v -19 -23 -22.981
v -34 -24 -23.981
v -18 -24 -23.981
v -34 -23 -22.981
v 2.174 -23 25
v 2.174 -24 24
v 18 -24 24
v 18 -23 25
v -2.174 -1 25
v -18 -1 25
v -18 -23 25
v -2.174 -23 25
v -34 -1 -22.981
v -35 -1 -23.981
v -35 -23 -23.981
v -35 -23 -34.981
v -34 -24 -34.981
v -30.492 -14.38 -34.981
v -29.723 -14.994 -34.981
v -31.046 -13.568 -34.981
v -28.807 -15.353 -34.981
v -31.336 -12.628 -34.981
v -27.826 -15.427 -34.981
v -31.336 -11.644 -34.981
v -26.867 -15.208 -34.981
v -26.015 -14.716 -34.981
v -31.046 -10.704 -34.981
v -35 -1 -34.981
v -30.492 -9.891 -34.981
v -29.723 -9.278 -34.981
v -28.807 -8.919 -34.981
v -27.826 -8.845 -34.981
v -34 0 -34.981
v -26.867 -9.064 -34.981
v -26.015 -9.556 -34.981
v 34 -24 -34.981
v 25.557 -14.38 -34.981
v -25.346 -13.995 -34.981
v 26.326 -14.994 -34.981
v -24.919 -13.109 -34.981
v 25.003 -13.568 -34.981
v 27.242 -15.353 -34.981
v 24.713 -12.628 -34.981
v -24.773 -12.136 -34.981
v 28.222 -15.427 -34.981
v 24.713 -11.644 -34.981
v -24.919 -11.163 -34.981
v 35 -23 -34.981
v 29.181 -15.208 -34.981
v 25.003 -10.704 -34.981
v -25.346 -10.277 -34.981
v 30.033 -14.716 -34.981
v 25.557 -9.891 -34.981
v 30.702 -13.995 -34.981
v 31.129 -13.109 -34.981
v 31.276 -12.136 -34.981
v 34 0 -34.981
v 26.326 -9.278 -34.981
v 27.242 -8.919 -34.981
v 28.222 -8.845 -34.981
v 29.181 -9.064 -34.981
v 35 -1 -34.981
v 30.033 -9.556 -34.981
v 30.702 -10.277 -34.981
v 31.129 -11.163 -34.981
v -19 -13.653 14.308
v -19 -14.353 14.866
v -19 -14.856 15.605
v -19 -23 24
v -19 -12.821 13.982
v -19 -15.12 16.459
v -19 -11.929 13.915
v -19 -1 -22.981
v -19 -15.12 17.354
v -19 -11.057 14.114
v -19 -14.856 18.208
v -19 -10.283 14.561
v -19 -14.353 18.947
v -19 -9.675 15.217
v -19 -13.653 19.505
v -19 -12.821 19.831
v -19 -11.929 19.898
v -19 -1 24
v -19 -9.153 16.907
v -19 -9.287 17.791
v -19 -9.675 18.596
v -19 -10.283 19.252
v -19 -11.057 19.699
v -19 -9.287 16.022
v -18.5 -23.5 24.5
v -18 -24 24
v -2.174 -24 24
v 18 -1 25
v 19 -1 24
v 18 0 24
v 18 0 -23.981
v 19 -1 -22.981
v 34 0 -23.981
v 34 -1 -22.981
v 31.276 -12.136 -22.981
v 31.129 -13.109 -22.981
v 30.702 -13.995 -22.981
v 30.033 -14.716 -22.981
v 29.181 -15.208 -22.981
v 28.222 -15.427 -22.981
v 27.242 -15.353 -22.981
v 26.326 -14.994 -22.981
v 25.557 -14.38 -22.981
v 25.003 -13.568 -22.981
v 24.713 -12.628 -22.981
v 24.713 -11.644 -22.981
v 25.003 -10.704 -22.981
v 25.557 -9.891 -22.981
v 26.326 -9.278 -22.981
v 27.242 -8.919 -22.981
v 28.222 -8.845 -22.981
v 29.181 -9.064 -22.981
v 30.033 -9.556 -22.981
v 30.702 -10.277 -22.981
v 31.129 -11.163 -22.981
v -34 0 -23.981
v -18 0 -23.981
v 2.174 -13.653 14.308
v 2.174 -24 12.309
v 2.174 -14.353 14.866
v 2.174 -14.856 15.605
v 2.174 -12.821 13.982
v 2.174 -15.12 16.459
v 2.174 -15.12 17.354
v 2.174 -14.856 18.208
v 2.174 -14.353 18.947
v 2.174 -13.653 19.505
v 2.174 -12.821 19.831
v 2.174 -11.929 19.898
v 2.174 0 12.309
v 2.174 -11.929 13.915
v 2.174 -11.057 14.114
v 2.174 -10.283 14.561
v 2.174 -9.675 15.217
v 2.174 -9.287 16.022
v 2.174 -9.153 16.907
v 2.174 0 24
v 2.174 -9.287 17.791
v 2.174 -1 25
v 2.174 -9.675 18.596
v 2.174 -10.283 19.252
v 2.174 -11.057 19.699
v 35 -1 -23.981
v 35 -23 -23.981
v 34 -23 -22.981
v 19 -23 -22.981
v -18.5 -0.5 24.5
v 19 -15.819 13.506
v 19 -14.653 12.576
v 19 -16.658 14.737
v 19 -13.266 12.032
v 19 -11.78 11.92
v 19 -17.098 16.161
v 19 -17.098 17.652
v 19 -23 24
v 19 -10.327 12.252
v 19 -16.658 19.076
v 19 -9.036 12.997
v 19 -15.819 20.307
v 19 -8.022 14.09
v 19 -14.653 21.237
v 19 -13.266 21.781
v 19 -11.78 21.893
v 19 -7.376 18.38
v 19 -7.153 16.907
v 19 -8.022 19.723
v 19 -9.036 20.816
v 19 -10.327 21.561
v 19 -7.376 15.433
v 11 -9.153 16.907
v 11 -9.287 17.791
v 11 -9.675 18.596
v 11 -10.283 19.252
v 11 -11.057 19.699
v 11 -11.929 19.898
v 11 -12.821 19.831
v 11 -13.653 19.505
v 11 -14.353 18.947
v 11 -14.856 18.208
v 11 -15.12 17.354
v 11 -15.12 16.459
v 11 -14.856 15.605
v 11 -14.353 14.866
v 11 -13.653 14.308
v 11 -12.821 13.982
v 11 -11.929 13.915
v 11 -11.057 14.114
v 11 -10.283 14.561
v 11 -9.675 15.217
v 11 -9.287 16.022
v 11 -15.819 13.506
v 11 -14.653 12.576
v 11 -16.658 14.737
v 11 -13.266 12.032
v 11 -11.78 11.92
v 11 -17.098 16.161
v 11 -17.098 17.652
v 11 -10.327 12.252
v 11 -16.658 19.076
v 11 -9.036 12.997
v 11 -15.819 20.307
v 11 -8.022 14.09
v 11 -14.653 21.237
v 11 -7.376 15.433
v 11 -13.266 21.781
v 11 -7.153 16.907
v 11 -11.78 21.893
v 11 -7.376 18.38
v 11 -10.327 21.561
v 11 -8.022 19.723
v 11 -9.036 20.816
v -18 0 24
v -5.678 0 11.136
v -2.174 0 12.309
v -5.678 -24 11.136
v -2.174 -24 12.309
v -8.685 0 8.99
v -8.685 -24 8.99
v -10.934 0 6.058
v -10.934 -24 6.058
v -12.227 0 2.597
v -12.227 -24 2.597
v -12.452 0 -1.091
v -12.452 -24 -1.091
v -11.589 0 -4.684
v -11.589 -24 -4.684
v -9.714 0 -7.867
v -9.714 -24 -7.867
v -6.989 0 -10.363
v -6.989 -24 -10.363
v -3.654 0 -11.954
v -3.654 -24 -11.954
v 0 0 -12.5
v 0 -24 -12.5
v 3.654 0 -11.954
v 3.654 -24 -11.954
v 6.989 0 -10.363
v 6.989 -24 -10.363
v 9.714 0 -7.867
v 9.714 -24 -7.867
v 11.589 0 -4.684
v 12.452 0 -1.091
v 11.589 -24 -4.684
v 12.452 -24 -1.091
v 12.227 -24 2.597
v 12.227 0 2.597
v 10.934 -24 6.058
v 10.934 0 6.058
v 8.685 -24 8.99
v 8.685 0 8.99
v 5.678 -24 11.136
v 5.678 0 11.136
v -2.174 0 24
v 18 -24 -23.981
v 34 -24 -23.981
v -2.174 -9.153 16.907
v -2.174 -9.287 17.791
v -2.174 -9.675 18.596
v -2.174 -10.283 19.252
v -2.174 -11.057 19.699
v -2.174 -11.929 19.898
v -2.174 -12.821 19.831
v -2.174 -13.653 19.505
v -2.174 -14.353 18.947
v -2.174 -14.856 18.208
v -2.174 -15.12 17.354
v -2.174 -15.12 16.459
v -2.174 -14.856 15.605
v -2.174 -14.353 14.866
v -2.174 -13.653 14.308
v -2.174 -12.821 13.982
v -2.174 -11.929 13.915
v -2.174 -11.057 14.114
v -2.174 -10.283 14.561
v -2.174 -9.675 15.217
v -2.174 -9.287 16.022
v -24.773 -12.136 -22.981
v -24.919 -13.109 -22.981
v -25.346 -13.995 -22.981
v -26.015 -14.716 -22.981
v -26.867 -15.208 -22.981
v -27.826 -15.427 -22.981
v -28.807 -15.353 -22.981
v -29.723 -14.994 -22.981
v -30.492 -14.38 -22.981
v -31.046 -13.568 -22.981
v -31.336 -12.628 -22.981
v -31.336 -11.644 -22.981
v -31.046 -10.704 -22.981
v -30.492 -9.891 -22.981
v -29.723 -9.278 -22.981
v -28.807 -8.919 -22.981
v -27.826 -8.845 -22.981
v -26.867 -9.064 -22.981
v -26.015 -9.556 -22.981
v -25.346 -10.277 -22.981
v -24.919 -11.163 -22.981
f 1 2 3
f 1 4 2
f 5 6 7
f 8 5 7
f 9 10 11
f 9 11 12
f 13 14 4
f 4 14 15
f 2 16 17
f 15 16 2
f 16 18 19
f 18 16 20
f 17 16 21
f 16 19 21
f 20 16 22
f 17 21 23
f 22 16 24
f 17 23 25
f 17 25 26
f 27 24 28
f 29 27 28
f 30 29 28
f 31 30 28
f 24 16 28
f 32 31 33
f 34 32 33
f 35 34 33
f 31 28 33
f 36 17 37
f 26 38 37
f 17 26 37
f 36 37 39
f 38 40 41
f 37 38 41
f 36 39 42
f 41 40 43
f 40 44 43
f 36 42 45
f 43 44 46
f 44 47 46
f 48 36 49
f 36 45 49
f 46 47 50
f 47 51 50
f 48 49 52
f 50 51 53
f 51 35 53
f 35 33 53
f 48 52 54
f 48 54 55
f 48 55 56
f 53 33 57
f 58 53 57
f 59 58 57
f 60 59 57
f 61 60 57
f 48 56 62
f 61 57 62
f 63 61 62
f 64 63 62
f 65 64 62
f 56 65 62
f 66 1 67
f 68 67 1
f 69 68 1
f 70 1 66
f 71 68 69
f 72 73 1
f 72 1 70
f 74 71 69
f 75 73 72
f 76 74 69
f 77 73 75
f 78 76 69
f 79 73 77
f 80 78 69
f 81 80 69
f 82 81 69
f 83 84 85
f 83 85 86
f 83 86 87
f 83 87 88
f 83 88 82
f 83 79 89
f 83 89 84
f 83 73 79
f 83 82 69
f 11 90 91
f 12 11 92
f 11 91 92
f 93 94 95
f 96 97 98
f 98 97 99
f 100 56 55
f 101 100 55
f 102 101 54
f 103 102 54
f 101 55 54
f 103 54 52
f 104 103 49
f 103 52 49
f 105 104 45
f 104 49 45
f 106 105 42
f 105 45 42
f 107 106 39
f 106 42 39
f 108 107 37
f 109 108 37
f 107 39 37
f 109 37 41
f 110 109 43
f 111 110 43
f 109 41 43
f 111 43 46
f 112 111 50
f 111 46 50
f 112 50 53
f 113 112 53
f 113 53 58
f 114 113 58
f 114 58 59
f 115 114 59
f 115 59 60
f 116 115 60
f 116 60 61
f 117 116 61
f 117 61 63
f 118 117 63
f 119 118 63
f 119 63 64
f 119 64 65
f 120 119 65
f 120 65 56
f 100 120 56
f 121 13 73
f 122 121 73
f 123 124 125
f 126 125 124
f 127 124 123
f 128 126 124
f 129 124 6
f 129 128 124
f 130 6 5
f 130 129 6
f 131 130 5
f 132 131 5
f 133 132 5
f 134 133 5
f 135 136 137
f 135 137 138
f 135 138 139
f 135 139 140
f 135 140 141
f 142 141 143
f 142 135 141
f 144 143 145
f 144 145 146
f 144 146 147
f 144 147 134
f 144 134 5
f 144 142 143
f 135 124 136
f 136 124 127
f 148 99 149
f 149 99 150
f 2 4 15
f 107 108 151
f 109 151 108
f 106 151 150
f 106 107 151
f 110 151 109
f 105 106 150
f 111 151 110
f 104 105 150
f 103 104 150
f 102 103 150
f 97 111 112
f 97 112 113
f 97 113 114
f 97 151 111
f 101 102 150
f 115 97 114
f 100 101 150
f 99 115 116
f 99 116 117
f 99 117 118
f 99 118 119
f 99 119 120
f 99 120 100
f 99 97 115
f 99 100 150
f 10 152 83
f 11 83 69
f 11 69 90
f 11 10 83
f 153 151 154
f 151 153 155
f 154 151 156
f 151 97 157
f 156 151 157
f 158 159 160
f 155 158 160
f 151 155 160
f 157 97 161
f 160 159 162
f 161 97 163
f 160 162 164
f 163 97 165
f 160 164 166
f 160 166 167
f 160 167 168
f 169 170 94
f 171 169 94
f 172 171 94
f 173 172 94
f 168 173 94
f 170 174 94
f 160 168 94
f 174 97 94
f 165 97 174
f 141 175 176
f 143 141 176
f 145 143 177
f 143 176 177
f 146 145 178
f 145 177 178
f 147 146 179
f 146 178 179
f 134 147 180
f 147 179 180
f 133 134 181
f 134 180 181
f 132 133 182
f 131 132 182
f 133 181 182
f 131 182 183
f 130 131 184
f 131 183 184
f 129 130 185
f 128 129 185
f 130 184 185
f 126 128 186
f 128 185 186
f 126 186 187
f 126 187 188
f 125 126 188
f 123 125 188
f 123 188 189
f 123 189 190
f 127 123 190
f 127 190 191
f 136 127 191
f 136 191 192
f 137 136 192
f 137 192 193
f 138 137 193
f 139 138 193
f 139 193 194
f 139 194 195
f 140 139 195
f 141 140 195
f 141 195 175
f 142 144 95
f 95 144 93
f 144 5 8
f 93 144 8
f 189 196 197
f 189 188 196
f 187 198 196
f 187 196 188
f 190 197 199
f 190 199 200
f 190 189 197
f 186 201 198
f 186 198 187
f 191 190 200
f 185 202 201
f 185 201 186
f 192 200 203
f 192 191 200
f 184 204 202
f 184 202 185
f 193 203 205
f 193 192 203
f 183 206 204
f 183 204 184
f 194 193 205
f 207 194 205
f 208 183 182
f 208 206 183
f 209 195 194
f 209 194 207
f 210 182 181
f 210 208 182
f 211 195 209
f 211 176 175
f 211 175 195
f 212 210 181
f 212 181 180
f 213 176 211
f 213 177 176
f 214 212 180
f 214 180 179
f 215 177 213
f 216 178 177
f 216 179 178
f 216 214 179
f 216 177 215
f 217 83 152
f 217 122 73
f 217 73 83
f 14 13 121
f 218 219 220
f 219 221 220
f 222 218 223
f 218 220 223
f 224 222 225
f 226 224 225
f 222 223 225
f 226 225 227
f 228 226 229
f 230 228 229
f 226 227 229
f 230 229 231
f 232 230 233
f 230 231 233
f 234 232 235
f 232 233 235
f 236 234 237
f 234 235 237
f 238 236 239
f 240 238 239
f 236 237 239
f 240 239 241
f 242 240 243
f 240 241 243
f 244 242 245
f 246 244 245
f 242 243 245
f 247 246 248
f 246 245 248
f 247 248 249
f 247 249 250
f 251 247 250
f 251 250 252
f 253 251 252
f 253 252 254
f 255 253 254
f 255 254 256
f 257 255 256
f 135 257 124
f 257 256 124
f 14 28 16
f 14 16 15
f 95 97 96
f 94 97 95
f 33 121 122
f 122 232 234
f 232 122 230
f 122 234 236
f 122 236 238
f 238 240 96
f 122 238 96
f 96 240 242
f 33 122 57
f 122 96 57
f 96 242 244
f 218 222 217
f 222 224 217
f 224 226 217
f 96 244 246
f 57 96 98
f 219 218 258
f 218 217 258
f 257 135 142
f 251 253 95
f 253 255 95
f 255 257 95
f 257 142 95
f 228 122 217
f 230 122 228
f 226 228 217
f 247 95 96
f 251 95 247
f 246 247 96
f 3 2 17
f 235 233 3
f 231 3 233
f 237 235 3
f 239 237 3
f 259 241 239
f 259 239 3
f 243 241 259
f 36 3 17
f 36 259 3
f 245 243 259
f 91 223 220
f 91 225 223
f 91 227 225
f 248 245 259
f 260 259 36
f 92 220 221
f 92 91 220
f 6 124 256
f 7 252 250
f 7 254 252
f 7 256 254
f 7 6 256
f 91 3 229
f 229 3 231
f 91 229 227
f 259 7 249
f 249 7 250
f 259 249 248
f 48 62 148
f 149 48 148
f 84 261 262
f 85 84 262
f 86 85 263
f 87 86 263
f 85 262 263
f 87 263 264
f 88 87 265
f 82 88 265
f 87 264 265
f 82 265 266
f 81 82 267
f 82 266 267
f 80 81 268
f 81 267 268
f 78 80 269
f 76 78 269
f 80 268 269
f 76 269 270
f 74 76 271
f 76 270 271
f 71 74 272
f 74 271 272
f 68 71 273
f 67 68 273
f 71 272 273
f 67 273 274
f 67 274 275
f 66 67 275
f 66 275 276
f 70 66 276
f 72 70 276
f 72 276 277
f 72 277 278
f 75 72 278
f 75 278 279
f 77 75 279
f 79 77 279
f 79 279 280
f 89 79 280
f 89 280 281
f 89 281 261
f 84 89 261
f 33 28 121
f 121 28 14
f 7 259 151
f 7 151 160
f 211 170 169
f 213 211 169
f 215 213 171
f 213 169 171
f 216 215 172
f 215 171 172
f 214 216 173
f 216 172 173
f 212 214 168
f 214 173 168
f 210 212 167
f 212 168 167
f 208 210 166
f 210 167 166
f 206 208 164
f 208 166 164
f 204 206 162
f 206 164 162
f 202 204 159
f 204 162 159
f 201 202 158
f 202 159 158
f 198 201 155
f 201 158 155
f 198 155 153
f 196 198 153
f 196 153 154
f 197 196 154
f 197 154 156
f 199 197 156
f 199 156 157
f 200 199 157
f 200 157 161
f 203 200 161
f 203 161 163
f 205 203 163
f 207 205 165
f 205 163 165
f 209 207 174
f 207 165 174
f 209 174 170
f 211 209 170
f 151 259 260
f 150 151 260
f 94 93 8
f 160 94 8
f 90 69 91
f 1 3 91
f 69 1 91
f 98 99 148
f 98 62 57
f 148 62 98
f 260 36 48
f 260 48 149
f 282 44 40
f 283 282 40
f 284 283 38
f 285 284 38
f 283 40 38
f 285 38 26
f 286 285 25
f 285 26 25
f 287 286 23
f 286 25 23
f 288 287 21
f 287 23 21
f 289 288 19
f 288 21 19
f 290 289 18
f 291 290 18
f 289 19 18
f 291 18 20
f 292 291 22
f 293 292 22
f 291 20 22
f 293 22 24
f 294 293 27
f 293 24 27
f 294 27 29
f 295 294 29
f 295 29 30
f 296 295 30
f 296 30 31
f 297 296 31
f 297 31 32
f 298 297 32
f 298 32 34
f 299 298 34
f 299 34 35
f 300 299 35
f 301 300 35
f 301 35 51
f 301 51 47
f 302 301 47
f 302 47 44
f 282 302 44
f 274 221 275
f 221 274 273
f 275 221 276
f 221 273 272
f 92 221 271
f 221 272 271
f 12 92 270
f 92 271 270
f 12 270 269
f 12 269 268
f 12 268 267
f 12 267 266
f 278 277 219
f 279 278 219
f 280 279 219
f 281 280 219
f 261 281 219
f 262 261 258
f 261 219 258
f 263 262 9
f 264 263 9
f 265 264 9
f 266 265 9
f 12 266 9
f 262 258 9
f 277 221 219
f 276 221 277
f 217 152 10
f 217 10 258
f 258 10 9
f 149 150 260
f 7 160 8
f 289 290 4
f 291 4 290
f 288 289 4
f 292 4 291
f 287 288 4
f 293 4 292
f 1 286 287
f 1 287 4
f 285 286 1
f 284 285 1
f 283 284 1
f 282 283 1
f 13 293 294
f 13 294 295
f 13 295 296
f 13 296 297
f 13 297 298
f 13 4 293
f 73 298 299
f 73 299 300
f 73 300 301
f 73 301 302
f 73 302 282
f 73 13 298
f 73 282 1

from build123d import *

# Parameters (mm, degrees)
F1_W      = 70
F1_H      = 12
F2_DEPTH  = 24
F3_W      = 38
F3_H      = 50
F4_DEPTH  = 24
F5_R      = 12.5
F6_DEPTH  = 24
F7_W      = 4.3481588364
F7_H      = 18.8432261348
F8_DEPTH  = 24
F9_R      = 3.3
F10_DEPTH = 25
F11_R     = 3.3
F12_DEPTH = 25
F13_R     = 3
F14_DEPTH = 50
F15_R     = 5
F15_R_2   = 3
F16_DEPTH = 8
F17_SIZE  = 1
F18_SIZE  = 1


with BuildPart() as f2:
    # F1 (on Front) → F2 (new body)
    with BuildSketch(Plane.XZ):
        with Locations((0, -28.981200866)):
            Rectangle(F1_W, F1_H)
    extrude(amount=F2_DEPTH)

    # F3 (on Front) → F4 (join)
    with BuildSketch(Plane.XZ):
        Rectangle(F3_W, F3_H)
    extrude(amount=F4_DEPTH)

    # F5 (on face) → F6 (cut)
    with BuildSketch(Plane.XZ.offset(24)):
        Circle(F5_R)
    extrude(amount=-F6_DEPTH, mode=Mode.SUBTRACT)

    # F7 (on Front) → F8 (cut)
    with BuildSketch(Plane.XZ):
        with Locations((0, 19.3257555366)):
            Rectangle(F7_W, F7_H)
    extrude(amount=F8_DEPTH, mode=Mode.SUBTRACT)

    # F9 (on face) → F10 (cut)
    with BuildSketch(Plane(origin=(0, 0, -34.981200866), x_dir=(1, 0, 0), z_dir=(0, 0, -1))):
        with Locations((-28.0725006014, 12.1359182522)):
            Circle(F9_R)
    extrude(amount=-F10_DEPTH, mode=Mode.SUBTRACT)

    # F11 (on face) → F12 (cut)
    with BuildSketch(Plane(origin=(0, 0, -34.981200866), x_dir=(1, 0, 0), z_dir=(0, 0, -1))):
        with Locations((27.9758609831, 12.1359182522)):
            Circle(F11_R)
    extrude(amount=-F12_DEPTH, mode=Mode.SUBTRACT)

    # F13 (on face) → F14 (cut)
    with BuildSketch(Plane.YZ.offset(19)):
        with Locations((-12.1533777565, 16.9065129012)):
            Circle(F13_R)
    extrude(amount=-F14_DEPTH, mode=Mode.SUBTRACT)

    # F15 (on face) → F16 (cut)
    with BuildSketch(Plane.YZ.offset(19)):
        with Locations((-12.1533777565, 16.9065129012)):
            Circle(F15_R)
        with Locations((-12.1533777565, 16.9065129012)):
            Circle(F15_R_2, mode=Mode.SUBTRACT)
    extrude(amount=-F16_DEPTH, mode=Mode.SUBTRACT)

    # F17
    f17_edges = [f2.edges().sort_by_distance(p)[0] for p in [
        (19, 0, 1.0094),
        (19, -12, 25),
        (19, -24, 1.0094),
        (27, 0, -22.981201),
        (35, -12, -22.981201),
        (27, -24, -22.981201),
        (35, 0, -28.981201),
        (35, -24, -28.981201),
        (10.58704, -24, 25),
        (-10.58704, -24, 25),
        (-10.58704, 0, 25),
        (10.58704, 0, 25),
    ]]
    chamfer(f17_edges, length=F17_SIZE)

    # F18 (call 1 of 2: OpenCascade refuses the feature's edges together)
    f18_edges = [f2.edges().sort_by_distance(p)[0] for p in [
        (-19, -12, 25),
    ]]
    chamfer(f18_edges, length=F18_SIZE)

    # F18#2 (call 2 of 2)
    f18_2_edges = [f2.edges().sort_by_distance(p)[0] for p in [
        (-19, 0, 0.5094),
        (-19, -24, 0.5094),
        (-27, -24, -22.981201),
        (-35, -12, -22.981201),
        (-27, 0, -22.981201),
        (-35, 0, -28.981201),
        (-35, -24, -28.981201),
    ]]
    chamfer(f18_2_edges, length=F18_SIZE)


solid = f2.part
